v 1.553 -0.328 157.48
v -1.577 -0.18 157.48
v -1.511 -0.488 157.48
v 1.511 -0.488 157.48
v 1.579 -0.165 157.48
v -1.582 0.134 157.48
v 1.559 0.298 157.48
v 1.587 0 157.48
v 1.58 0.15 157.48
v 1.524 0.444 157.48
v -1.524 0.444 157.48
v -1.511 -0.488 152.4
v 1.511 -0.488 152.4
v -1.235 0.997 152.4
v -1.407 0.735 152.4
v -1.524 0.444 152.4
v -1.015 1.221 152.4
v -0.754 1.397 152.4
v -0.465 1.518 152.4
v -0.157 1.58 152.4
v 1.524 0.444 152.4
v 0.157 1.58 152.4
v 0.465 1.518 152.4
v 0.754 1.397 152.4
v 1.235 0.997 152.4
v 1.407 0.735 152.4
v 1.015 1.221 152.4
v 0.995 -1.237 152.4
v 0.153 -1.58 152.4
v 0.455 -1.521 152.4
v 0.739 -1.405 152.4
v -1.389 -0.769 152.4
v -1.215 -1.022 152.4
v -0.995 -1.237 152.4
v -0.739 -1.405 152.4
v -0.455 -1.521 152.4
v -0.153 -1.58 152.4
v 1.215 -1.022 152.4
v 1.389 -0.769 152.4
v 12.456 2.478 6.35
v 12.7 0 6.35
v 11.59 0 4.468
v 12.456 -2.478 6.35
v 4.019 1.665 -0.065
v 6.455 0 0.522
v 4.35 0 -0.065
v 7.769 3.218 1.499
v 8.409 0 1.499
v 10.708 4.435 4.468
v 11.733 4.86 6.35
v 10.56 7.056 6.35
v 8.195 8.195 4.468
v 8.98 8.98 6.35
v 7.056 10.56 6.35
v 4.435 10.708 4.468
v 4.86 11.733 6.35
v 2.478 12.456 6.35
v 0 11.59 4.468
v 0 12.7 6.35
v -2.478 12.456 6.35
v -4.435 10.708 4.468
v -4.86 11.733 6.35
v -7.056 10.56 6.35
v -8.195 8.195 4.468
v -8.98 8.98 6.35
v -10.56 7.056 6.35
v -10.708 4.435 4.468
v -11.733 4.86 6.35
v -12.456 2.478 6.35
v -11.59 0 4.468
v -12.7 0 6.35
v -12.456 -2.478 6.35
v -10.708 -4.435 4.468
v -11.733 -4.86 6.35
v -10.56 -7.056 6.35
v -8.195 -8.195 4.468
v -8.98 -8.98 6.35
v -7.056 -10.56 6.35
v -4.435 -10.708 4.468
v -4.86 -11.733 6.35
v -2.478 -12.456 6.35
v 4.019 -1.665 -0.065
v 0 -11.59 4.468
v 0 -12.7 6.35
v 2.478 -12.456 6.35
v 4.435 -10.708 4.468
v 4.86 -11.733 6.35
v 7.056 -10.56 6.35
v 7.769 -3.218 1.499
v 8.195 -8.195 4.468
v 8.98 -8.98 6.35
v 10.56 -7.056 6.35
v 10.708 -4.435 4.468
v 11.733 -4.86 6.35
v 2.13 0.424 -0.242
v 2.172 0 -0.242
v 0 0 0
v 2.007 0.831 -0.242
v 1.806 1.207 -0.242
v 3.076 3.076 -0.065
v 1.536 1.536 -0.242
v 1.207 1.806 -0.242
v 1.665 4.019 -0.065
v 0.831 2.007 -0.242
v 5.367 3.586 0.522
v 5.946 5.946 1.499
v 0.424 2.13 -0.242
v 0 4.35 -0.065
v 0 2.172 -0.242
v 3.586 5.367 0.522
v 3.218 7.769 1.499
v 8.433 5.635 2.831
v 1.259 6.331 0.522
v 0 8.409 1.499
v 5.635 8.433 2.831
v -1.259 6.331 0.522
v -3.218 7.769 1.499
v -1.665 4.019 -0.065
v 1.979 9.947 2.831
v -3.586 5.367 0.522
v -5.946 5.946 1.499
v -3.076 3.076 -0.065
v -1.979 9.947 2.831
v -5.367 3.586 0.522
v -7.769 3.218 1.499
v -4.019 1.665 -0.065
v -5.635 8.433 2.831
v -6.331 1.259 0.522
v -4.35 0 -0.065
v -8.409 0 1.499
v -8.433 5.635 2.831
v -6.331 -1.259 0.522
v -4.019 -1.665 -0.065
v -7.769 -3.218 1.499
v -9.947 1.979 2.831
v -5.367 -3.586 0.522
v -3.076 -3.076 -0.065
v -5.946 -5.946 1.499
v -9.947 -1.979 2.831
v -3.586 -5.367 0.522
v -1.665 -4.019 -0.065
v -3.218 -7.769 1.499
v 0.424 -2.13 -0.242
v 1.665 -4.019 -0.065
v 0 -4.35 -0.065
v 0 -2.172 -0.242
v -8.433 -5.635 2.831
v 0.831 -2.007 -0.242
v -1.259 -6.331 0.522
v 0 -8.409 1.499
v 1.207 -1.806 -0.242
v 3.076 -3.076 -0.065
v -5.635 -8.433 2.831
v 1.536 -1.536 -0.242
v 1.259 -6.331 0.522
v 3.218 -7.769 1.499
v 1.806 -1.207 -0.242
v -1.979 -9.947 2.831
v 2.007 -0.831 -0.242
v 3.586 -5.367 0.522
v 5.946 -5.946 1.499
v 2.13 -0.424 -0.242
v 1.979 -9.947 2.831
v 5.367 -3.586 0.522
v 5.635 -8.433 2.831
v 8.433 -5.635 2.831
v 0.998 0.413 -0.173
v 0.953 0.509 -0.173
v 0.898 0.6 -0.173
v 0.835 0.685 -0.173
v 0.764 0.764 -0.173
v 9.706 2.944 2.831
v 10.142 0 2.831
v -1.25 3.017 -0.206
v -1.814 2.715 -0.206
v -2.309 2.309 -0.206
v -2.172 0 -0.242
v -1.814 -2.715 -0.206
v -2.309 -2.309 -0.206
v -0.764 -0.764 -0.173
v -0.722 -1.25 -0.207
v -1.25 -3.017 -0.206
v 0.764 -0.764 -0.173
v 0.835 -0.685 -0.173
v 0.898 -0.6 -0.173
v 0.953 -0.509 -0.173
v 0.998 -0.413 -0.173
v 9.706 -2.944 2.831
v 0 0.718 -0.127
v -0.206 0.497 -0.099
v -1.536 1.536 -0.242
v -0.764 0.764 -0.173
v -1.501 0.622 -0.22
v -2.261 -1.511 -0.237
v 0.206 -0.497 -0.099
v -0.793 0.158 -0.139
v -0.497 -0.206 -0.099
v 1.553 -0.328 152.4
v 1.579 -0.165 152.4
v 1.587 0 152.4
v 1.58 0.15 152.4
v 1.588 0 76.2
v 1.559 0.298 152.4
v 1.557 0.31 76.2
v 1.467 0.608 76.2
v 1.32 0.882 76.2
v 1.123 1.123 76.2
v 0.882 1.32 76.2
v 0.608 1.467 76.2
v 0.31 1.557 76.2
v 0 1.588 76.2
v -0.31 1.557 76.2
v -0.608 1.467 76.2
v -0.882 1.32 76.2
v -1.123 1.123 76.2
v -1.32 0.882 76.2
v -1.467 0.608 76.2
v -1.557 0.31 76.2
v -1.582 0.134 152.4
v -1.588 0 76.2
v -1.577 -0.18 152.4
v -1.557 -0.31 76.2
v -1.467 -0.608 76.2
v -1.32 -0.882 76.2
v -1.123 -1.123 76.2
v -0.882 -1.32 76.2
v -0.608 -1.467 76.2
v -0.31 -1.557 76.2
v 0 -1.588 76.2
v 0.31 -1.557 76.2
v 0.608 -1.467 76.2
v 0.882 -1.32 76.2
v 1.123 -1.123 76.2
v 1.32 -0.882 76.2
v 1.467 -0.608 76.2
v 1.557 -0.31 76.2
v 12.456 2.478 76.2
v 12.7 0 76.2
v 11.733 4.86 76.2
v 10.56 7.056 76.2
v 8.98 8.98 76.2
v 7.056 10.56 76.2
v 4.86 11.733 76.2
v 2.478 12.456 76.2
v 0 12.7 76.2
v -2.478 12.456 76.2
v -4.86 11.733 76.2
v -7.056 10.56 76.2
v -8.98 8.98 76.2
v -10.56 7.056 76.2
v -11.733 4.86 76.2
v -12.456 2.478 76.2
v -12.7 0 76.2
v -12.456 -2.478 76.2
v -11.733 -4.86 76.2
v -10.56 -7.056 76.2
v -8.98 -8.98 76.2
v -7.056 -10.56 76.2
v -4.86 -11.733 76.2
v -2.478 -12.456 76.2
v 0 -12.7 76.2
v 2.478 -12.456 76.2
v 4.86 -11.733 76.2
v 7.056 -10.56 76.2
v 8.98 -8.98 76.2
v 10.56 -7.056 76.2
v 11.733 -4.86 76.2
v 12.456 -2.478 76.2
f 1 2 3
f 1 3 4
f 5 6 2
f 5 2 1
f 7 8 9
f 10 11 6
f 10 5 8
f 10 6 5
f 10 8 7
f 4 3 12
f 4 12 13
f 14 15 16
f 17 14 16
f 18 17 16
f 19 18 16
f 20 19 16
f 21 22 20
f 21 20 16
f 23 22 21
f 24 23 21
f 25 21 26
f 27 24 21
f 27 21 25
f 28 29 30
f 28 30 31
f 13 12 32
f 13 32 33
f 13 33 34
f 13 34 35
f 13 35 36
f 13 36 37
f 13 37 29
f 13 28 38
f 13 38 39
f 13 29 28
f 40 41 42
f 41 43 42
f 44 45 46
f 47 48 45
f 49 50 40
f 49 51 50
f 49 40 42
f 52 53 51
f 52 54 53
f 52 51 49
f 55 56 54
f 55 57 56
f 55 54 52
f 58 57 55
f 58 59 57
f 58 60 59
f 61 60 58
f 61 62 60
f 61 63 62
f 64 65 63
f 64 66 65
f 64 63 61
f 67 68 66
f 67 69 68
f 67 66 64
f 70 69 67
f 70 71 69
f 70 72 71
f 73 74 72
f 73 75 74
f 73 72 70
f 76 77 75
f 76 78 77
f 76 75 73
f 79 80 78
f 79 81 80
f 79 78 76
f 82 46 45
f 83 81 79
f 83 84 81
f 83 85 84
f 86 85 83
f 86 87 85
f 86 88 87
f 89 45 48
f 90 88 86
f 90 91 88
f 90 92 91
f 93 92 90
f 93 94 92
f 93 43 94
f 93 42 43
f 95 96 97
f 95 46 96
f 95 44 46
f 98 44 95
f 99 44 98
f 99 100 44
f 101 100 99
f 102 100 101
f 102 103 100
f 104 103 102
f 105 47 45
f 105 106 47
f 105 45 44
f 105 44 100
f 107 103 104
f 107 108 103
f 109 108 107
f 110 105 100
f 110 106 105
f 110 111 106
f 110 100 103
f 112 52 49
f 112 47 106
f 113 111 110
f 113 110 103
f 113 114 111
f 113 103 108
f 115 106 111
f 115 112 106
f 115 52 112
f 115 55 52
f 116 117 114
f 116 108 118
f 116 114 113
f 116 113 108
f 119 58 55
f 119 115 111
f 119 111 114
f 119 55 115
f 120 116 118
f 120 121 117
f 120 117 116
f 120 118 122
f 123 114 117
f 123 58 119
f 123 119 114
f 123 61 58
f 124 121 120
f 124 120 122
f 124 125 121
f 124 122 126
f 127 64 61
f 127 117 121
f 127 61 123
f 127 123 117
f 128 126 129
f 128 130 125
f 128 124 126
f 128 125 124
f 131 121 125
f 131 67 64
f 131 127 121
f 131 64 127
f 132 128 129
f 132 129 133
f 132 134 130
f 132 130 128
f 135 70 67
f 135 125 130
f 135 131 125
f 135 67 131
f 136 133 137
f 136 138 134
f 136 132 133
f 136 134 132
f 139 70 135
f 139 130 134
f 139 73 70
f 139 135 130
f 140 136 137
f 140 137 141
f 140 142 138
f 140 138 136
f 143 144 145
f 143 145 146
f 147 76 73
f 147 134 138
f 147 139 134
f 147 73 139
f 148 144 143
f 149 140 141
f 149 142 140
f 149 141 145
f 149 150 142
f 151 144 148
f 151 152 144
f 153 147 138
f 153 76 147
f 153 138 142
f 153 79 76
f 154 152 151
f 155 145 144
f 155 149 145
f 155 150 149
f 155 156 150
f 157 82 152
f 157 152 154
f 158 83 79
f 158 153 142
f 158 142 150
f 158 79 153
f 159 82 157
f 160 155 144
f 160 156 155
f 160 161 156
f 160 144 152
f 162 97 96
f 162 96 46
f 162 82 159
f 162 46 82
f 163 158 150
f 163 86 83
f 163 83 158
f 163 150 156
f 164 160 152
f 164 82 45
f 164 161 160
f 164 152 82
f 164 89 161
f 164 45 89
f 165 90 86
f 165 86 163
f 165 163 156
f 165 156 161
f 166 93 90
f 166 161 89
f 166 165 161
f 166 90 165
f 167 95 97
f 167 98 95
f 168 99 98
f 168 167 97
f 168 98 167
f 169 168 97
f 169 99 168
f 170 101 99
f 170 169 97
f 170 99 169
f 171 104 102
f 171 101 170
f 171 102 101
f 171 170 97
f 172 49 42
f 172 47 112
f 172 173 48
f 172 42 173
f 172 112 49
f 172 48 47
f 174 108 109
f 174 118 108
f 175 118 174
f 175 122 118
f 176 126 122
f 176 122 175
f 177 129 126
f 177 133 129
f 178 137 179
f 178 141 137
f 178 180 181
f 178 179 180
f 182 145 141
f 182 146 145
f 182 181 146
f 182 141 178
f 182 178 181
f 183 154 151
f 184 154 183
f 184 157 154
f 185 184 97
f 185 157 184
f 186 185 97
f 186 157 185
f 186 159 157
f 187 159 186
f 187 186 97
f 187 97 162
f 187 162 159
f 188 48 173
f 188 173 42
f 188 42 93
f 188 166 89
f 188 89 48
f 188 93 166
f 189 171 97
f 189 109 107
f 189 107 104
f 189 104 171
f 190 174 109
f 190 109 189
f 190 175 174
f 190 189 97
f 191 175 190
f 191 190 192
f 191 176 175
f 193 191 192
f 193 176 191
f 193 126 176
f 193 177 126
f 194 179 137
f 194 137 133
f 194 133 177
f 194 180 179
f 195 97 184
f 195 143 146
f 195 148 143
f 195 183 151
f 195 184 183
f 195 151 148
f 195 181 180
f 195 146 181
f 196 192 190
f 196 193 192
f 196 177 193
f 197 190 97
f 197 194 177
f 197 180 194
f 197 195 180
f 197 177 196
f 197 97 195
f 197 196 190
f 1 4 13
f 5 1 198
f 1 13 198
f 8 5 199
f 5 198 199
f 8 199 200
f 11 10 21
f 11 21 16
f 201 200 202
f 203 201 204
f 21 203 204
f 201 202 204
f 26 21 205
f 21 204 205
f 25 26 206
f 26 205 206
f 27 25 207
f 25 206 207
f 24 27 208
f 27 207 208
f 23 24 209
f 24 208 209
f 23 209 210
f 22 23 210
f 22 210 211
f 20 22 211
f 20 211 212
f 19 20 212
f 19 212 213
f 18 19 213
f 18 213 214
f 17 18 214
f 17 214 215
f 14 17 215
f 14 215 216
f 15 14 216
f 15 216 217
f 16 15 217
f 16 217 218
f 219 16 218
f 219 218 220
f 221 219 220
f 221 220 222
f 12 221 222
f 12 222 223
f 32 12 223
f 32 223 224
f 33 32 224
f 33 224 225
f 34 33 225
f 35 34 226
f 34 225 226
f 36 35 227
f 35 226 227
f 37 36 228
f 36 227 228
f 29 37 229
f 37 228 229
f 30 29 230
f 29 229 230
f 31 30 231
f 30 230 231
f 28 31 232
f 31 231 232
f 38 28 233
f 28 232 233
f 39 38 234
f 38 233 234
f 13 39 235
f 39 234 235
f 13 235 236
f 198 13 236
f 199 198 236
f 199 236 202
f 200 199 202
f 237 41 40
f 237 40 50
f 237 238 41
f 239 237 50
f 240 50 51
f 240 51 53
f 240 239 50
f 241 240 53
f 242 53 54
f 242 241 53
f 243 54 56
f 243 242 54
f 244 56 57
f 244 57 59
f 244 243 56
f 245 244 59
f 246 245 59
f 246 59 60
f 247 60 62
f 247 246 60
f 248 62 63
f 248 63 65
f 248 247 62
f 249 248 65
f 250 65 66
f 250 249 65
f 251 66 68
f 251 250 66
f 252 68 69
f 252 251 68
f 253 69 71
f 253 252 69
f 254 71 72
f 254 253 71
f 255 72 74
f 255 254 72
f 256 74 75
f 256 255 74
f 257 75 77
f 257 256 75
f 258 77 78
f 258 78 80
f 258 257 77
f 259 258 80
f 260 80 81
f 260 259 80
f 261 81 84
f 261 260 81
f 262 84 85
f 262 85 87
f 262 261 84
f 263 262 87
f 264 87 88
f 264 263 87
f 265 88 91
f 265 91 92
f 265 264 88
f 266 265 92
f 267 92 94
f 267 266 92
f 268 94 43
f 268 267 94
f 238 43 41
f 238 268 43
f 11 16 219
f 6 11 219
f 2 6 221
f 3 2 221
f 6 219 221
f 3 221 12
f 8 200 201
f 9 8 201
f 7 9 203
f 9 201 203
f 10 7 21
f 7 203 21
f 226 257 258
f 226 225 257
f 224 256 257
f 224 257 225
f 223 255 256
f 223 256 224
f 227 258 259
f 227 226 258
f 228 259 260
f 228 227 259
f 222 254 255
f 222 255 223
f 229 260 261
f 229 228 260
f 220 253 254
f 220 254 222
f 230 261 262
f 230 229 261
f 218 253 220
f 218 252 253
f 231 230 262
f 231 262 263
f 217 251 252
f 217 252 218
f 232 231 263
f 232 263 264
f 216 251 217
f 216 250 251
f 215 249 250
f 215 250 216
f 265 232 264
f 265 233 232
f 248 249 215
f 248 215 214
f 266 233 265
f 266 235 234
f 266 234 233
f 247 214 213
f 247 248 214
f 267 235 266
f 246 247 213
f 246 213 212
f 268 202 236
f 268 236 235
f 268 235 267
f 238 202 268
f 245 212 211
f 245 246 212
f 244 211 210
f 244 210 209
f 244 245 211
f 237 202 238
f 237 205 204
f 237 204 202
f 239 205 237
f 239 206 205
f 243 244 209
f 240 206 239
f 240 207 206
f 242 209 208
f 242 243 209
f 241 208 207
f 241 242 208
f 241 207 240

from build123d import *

# Parameters (mm, degrees)
F2_R     = 1.5875
F3_DEPTH = 152.4
F5_DEPTH = 5.08


with BuildPart() as f1:
    # F0 (on Front) → F1 (revolve)
    with BuildSketch(Plane.XZ):
        with BuildLine():
            Line((0, 76.2), (0, 0))
            ThreePointArc((0, 0), (7.4556115815, 0.963776837), (12.7, 6.35))
            Line((12.7, 6.35), (12.7, 76.2))
            Line((12.7, 76.2), (0, 76.2))
        make_face()
    revolve(axis=Axis((0, 0, 38.1), (0, 0, 1)))

    # F2 (on Top) → F3 (join)
    with BuildSketch(Plane.XY):
        Circle(F2_R)
    extrude(amount=F3_DEPTH)

    # F4 (on face) → F5 (join)
    with BuildSketch(Plane.XY.offset(152.4)):
        with BuildLine():
            Line((1.5242467692, 0.4436530587), (-1.5242467692, 0.4436530587))
            ThreePointArc((-1.5242467692, 0.4436530587), (-1.5873331828, -0.0230134024), (-1.5107445232, -0.4876548326))
            Line((-1.5107445232, -0.4876548326), (1.5107445232, -0.4876548326))
            ThreePointArc((1.5107445232, -0.4876548326), (1.5681937349, -0.2468292117), (1.5875, 0))
            ThreePointArc((1.5875, 0), (1.5716071386, 0.2240697479), (1.5242467692, 0.4436530587))
        make_face()
    extrude(amount=F5_DEPTH)


solid = f1.part
